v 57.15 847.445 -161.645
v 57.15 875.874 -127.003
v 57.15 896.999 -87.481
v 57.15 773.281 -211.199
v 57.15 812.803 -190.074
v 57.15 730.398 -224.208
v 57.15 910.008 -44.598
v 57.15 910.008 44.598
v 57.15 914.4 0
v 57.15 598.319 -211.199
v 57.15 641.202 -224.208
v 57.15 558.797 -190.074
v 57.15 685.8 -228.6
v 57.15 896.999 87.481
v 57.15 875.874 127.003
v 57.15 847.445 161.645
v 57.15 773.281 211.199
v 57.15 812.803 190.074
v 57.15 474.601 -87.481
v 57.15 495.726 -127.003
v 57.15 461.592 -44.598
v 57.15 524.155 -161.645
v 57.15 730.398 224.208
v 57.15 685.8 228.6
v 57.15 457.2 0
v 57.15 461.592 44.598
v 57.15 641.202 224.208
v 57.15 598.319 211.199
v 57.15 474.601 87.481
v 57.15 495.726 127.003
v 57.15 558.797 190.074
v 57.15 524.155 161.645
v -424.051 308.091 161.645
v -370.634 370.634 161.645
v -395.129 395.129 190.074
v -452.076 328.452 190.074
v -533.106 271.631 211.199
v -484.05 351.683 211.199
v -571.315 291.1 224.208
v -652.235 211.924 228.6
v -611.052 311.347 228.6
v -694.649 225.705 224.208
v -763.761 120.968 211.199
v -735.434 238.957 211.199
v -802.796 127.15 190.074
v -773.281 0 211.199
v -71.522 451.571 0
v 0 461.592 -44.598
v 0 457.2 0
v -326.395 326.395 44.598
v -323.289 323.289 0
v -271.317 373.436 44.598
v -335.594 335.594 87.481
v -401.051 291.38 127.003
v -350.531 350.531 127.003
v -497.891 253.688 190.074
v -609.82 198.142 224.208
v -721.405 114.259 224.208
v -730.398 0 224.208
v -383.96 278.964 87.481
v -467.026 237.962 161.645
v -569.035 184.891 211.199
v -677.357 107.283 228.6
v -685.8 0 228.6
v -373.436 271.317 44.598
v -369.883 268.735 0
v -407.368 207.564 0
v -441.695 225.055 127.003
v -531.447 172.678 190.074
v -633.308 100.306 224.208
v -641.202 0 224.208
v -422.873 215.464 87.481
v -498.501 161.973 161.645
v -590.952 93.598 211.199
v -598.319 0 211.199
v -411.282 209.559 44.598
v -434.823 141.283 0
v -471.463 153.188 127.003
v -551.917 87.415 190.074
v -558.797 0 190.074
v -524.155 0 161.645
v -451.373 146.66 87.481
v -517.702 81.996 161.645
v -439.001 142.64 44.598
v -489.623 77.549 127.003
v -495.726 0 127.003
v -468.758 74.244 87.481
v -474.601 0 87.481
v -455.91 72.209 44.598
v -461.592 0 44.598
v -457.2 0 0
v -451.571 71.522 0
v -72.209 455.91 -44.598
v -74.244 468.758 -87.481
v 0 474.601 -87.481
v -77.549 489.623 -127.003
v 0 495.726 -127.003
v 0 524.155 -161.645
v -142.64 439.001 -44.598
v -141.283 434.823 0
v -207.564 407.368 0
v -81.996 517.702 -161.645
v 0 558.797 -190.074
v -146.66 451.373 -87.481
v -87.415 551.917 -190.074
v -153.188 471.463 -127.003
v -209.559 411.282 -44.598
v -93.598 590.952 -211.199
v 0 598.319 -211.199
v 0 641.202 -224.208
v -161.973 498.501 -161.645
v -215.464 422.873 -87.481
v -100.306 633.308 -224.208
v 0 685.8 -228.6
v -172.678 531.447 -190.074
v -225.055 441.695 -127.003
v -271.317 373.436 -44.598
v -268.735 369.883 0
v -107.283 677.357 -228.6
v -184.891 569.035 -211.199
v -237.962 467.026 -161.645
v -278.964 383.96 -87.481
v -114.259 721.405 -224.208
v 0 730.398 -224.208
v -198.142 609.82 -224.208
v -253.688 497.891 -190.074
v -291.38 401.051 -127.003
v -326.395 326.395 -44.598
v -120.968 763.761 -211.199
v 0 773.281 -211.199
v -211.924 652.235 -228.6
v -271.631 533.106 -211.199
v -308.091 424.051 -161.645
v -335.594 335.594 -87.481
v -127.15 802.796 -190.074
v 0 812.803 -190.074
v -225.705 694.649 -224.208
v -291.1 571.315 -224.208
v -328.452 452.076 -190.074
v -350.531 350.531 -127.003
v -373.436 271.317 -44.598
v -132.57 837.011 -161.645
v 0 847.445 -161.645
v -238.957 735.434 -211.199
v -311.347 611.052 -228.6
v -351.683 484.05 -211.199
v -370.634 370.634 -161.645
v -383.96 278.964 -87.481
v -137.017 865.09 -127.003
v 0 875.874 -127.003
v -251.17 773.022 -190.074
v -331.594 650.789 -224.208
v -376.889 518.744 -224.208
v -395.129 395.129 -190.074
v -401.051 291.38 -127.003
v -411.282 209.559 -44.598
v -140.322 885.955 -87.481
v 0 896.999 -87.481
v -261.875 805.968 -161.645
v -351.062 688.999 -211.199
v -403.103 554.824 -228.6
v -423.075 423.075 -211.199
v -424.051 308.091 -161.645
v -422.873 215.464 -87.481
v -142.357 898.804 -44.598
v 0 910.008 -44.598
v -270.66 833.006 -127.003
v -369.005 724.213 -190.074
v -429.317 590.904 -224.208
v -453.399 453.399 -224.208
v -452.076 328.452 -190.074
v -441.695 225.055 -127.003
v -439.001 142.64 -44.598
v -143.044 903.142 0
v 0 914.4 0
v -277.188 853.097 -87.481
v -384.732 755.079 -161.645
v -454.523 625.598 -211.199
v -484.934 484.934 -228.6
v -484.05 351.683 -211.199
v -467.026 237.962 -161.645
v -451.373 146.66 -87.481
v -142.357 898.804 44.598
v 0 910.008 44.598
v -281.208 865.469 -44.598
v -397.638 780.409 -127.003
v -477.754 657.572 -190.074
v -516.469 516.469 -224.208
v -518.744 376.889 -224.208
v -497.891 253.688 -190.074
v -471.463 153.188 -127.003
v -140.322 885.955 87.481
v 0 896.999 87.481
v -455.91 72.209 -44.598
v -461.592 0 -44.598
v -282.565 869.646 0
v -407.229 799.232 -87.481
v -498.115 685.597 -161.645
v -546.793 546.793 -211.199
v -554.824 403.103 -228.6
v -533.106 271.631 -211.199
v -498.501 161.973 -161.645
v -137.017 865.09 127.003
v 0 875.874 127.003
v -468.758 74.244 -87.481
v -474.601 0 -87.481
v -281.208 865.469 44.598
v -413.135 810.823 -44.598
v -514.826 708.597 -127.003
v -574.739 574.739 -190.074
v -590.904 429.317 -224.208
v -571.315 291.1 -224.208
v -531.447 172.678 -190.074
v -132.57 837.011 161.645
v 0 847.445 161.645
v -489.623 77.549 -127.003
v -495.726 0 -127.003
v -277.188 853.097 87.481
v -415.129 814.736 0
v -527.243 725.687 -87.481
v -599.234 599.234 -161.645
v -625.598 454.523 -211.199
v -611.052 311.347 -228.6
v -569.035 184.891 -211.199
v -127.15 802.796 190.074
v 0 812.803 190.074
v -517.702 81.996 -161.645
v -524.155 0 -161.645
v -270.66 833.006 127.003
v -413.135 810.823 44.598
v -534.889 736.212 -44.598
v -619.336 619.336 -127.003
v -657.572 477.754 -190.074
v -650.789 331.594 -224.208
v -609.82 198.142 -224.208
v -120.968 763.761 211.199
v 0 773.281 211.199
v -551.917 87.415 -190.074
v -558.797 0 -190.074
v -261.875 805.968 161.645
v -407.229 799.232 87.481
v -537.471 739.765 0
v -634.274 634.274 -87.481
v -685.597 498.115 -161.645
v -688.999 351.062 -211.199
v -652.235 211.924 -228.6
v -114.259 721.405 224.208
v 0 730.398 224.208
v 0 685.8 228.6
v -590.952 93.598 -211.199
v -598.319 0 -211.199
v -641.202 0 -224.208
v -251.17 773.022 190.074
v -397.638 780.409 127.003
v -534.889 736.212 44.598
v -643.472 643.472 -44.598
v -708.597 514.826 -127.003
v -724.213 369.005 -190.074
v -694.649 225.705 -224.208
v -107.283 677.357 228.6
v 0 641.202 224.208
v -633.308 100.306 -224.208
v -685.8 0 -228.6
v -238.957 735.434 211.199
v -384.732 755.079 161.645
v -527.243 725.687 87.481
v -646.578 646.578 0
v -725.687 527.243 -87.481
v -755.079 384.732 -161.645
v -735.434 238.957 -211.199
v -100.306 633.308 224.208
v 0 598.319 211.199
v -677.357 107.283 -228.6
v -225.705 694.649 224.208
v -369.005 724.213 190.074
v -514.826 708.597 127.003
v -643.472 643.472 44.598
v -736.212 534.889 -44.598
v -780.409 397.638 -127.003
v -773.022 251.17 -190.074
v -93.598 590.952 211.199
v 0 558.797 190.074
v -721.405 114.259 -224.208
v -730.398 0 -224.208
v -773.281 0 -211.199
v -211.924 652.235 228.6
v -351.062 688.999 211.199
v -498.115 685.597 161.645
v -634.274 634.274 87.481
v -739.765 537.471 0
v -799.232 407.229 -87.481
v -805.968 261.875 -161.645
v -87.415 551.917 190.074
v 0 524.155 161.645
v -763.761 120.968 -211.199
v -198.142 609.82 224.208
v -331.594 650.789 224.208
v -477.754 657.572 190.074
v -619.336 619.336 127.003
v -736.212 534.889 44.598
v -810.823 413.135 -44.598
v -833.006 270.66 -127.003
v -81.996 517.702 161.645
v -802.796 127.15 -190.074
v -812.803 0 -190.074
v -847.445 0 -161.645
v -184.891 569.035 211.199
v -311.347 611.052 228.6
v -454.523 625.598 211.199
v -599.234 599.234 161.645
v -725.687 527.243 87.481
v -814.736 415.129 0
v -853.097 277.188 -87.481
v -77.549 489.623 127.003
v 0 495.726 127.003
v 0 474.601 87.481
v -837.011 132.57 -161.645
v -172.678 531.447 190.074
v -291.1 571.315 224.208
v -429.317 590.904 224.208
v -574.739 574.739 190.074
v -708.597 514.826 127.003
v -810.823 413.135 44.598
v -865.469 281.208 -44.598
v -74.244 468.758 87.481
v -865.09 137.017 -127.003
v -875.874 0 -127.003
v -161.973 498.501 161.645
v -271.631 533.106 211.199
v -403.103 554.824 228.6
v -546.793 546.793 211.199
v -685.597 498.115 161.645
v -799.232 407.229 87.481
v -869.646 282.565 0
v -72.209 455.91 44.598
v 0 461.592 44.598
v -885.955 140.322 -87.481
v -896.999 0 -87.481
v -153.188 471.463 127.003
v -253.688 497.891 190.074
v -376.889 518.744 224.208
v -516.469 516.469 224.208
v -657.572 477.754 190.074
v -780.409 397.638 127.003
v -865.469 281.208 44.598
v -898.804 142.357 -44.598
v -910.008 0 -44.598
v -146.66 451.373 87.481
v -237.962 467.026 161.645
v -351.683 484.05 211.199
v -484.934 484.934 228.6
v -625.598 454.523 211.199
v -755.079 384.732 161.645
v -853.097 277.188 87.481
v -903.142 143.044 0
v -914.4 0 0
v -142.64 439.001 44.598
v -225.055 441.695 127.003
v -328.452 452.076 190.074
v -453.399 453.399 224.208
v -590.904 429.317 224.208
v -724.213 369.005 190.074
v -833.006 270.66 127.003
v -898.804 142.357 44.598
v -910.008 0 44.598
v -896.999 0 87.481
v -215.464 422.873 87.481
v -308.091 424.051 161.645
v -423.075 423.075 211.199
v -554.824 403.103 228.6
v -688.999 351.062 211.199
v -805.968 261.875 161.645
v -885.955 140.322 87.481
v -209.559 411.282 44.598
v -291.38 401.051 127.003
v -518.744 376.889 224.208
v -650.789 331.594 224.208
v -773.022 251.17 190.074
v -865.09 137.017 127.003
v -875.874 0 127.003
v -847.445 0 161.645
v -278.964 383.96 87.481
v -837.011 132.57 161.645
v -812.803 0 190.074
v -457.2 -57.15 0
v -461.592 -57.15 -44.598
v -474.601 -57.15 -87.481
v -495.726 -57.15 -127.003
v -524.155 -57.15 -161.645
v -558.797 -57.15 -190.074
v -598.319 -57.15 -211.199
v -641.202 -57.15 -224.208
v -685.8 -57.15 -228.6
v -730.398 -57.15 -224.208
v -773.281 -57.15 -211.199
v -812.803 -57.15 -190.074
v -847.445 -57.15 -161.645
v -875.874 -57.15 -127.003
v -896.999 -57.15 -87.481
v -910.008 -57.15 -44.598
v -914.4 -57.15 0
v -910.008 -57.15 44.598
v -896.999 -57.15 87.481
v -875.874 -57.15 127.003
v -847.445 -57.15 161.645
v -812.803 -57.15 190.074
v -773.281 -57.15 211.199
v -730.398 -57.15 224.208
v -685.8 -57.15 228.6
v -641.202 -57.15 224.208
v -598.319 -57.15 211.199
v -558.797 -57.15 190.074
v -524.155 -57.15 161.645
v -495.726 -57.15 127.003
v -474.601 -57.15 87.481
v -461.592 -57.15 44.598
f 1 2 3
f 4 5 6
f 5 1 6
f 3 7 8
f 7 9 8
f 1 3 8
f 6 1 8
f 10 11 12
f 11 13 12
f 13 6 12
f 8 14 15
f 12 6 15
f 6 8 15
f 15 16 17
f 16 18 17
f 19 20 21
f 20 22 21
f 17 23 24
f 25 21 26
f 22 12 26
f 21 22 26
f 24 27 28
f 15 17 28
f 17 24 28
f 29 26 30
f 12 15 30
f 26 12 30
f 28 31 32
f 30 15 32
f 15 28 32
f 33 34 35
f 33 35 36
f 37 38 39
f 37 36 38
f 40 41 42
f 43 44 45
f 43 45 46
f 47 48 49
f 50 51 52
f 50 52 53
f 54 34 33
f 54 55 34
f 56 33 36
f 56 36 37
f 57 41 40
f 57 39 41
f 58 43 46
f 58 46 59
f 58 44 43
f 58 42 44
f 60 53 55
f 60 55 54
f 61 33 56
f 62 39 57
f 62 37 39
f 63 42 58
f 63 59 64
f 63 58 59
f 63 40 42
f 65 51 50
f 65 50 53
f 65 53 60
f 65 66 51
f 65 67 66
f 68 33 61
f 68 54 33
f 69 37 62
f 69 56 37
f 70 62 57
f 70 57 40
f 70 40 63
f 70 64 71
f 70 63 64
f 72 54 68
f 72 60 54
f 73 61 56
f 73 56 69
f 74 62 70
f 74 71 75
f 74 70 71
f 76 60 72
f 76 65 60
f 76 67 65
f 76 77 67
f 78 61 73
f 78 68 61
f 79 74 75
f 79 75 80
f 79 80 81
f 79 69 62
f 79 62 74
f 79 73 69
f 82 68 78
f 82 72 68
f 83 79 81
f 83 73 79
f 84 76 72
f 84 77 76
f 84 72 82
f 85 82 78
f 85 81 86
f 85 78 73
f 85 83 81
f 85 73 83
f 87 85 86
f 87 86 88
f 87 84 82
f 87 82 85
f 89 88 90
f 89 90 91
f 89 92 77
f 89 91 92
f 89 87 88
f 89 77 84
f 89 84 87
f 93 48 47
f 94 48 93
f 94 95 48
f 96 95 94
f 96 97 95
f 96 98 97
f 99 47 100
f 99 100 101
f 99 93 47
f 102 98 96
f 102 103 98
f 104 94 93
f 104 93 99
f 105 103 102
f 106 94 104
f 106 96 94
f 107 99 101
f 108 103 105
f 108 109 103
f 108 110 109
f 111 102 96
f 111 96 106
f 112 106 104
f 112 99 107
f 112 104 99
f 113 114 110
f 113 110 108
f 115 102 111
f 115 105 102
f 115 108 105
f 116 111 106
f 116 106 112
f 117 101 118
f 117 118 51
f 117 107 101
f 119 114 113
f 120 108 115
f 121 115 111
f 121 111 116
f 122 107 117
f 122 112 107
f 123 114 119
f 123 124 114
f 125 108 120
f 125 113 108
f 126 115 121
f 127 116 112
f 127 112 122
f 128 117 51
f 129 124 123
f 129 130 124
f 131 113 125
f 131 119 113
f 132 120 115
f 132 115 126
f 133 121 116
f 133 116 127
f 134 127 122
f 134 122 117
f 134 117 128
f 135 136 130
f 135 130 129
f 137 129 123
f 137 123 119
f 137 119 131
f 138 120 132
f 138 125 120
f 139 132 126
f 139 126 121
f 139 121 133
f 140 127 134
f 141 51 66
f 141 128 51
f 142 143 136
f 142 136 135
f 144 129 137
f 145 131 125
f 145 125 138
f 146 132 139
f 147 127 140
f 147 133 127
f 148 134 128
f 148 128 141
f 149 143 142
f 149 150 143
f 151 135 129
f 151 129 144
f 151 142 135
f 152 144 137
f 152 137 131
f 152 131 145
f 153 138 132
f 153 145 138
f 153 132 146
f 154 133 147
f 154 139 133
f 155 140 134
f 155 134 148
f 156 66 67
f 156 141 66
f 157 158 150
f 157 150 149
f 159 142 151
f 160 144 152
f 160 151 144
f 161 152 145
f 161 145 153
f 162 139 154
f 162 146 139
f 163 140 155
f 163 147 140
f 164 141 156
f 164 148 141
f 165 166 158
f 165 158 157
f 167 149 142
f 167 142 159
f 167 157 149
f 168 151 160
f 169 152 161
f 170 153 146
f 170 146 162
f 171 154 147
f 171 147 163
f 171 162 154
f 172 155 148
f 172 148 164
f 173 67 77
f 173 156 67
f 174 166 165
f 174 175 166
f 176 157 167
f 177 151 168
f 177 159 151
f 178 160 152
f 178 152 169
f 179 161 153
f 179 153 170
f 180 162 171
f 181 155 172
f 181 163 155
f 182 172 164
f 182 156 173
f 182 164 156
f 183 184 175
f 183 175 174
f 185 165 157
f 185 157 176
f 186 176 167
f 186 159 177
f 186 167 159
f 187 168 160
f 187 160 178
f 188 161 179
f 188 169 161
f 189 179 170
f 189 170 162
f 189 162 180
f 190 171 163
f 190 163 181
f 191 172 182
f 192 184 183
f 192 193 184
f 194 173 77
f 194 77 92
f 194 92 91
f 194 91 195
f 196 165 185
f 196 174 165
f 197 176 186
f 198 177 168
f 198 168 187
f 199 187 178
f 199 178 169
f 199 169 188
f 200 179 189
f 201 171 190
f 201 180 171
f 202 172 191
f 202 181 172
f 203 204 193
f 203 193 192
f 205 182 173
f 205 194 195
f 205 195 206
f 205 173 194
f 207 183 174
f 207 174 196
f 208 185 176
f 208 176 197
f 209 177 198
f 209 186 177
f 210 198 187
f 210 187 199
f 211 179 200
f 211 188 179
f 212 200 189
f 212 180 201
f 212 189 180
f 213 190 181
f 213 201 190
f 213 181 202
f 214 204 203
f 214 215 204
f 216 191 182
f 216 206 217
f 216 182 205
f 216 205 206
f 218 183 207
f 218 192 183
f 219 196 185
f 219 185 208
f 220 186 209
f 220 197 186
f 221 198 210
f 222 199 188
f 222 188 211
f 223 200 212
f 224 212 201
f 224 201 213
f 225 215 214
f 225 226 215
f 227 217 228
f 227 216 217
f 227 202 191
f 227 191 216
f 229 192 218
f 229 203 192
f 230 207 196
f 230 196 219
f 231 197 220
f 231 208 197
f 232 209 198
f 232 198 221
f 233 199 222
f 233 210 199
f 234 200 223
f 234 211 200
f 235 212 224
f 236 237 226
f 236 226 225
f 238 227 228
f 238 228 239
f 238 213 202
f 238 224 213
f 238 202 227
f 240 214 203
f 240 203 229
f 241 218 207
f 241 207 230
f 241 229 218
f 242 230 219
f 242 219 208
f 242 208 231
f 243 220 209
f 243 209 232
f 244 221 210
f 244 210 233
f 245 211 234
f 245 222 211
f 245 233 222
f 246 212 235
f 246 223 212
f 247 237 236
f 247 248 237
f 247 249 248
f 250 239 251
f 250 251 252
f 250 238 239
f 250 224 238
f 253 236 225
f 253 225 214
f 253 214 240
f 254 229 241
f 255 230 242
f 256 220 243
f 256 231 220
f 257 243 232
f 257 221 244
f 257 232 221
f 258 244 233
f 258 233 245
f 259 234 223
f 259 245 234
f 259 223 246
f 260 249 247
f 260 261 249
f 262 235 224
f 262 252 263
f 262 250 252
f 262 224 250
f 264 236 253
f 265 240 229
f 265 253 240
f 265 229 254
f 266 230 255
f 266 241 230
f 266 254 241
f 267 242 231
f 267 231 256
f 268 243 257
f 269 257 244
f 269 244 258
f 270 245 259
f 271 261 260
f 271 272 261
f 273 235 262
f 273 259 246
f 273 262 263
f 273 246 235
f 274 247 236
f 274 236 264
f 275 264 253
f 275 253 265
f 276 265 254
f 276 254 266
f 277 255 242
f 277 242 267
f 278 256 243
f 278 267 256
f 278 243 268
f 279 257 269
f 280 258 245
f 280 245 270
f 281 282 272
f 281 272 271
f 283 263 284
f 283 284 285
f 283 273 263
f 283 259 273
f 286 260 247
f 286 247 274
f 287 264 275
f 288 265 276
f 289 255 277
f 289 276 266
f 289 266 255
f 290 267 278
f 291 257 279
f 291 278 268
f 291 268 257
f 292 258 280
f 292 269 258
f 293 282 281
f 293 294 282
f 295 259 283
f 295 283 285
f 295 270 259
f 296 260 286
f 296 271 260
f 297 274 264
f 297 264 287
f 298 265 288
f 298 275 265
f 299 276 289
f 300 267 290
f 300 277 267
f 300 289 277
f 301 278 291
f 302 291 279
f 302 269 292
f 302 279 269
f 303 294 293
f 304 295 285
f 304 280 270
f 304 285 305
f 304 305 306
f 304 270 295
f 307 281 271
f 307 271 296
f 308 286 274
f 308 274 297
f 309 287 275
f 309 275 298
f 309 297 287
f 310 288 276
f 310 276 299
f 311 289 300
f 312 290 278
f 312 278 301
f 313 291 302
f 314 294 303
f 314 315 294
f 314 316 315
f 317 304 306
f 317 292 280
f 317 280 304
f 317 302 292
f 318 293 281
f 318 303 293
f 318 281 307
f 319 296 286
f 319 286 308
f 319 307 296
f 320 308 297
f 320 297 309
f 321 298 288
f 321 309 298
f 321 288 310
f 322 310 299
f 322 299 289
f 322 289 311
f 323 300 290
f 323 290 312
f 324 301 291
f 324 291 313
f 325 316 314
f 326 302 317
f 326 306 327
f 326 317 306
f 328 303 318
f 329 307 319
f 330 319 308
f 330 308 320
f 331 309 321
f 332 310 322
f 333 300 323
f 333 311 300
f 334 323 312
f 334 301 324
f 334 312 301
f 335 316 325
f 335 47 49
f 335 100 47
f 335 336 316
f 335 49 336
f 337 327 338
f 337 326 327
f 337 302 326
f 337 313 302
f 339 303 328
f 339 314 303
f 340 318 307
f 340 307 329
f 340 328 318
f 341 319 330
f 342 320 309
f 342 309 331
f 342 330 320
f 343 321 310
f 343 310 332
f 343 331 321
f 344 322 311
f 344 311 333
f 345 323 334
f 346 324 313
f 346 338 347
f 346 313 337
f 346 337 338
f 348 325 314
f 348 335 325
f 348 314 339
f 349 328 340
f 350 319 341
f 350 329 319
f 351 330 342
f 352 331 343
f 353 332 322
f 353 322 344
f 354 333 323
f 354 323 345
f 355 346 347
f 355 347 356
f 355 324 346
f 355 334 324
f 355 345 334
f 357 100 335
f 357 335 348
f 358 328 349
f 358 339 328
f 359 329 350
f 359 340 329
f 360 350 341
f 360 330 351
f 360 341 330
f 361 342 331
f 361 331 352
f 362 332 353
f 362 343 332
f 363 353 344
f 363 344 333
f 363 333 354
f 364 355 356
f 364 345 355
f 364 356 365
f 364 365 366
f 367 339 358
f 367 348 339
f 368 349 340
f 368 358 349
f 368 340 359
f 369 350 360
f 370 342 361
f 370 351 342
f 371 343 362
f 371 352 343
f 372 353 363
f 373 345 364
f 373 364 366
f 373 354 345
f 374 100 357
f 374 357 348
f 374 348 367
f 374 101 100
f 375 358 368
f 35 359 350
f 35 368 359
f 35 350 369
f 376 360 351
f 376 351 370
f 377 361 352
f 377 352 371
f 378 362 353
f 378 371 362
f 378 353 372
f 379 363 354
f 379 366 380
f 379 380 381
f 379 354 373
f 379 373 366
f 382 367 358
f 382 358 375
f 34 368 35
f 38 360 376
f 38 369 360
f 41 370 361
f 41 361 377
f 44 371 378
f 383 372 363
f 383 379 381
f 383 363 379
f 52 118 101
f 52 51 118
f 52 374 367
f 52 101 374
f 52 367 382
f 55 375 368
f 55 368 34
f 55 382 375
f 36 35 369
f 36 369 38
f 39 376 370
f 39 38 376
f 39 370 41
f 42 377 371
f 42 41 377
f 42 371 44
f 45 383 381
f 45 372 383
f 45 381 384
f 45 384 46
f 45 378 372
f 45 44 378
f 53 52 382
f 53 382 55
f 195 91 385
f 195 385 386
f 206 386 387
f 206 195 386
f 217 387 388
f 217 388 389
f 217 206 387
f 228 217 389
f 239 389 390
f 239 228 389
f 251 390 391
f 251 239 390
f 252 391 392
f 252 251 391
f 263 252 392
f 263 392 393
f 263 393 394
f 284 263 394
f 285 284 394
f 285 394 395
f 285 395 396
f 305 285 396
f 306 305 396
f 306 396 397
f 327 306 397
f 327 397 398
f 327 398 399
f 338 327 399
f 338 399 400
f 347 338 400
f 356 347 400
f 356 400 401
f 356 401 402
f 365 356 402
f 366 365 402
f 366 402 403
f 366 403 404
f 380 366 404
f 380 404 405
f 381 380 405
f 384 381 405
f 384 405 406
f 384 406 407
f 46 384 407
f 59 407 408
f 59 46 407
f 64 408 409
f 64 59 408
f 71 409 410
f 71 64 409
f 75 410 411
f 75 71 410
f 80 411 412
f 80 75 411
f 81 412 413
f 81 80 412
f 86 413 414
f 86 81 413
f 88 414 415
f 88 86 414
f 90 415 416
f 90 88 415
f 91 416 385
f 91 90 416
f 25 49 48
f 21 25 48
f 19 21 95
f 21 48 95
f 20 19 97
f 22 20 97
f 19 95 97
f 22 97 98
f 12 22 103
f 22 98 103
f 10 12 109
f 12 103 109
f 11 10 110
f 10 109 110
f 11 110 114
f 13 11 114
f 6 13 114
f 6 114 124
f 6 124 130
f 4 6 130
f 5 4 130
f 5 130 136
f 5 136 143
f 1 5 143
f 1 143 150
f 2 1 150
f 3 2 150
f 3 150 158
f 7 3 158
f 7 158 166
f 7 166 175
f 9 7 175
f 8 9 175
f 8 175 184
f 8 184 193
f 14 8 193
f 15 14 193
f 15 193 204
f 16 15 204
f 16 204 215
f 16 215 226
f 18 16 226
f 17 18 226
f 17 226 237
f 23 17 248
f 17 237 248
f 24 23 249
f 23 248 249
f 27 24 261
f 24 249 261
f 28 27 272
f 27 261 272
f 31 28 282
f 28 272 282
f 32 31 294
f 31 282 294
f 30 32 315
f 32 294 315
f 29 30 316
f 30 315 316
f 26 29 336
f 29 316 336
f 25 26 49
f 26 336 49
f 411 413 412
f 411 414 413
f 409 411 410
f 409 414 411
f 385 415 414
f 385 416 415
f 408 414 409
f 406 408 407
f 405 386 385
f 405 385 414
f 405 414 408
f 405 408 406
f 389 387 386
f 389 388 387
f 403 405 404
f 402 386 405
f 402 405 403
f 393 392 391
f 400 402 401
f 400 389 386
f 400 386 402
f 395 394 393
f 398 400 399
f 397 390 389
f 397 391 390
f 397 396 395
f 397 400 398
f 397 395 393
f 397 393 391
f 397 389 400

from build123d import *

# Parameters (mm, degrees)
F0_R     = 228.6
F3_DEPTH = 57.15
F4_DEPTH = 57.15


with BuildPart() as f2:
    # F2: sweep along a path in F1
    with BuildLine(Plane.XY) as f2_path:
        ThreePointArc((0, 457.2), (-323.2892203585, 323.2892203585), (-457.2, 0))
    # F0 (on Front) → F2 (sweep)
    with BuildSketch(Plane.XZ):
        with Locations((-685.8, 0)):
            Circle(F0_R)
    sweep(path=f2_path.line)

    # F3 (add): a face of the model
    f3_faces = [f2.faces().sort_by_distance(p)[0] for p in [
        (-685.8, 0, 0),
    ]]
    extrude(f3_faces, amount=F3_DEPTH)

    # F4 (add): a face of the model
    f4_faces = [f2.faces().sort_by_distance(p)[0] for p in [
        (0, 685.8, 0),
    ]]
    extrude(f4_faces, amount=F4_DEPTH)


solid = f2.part
